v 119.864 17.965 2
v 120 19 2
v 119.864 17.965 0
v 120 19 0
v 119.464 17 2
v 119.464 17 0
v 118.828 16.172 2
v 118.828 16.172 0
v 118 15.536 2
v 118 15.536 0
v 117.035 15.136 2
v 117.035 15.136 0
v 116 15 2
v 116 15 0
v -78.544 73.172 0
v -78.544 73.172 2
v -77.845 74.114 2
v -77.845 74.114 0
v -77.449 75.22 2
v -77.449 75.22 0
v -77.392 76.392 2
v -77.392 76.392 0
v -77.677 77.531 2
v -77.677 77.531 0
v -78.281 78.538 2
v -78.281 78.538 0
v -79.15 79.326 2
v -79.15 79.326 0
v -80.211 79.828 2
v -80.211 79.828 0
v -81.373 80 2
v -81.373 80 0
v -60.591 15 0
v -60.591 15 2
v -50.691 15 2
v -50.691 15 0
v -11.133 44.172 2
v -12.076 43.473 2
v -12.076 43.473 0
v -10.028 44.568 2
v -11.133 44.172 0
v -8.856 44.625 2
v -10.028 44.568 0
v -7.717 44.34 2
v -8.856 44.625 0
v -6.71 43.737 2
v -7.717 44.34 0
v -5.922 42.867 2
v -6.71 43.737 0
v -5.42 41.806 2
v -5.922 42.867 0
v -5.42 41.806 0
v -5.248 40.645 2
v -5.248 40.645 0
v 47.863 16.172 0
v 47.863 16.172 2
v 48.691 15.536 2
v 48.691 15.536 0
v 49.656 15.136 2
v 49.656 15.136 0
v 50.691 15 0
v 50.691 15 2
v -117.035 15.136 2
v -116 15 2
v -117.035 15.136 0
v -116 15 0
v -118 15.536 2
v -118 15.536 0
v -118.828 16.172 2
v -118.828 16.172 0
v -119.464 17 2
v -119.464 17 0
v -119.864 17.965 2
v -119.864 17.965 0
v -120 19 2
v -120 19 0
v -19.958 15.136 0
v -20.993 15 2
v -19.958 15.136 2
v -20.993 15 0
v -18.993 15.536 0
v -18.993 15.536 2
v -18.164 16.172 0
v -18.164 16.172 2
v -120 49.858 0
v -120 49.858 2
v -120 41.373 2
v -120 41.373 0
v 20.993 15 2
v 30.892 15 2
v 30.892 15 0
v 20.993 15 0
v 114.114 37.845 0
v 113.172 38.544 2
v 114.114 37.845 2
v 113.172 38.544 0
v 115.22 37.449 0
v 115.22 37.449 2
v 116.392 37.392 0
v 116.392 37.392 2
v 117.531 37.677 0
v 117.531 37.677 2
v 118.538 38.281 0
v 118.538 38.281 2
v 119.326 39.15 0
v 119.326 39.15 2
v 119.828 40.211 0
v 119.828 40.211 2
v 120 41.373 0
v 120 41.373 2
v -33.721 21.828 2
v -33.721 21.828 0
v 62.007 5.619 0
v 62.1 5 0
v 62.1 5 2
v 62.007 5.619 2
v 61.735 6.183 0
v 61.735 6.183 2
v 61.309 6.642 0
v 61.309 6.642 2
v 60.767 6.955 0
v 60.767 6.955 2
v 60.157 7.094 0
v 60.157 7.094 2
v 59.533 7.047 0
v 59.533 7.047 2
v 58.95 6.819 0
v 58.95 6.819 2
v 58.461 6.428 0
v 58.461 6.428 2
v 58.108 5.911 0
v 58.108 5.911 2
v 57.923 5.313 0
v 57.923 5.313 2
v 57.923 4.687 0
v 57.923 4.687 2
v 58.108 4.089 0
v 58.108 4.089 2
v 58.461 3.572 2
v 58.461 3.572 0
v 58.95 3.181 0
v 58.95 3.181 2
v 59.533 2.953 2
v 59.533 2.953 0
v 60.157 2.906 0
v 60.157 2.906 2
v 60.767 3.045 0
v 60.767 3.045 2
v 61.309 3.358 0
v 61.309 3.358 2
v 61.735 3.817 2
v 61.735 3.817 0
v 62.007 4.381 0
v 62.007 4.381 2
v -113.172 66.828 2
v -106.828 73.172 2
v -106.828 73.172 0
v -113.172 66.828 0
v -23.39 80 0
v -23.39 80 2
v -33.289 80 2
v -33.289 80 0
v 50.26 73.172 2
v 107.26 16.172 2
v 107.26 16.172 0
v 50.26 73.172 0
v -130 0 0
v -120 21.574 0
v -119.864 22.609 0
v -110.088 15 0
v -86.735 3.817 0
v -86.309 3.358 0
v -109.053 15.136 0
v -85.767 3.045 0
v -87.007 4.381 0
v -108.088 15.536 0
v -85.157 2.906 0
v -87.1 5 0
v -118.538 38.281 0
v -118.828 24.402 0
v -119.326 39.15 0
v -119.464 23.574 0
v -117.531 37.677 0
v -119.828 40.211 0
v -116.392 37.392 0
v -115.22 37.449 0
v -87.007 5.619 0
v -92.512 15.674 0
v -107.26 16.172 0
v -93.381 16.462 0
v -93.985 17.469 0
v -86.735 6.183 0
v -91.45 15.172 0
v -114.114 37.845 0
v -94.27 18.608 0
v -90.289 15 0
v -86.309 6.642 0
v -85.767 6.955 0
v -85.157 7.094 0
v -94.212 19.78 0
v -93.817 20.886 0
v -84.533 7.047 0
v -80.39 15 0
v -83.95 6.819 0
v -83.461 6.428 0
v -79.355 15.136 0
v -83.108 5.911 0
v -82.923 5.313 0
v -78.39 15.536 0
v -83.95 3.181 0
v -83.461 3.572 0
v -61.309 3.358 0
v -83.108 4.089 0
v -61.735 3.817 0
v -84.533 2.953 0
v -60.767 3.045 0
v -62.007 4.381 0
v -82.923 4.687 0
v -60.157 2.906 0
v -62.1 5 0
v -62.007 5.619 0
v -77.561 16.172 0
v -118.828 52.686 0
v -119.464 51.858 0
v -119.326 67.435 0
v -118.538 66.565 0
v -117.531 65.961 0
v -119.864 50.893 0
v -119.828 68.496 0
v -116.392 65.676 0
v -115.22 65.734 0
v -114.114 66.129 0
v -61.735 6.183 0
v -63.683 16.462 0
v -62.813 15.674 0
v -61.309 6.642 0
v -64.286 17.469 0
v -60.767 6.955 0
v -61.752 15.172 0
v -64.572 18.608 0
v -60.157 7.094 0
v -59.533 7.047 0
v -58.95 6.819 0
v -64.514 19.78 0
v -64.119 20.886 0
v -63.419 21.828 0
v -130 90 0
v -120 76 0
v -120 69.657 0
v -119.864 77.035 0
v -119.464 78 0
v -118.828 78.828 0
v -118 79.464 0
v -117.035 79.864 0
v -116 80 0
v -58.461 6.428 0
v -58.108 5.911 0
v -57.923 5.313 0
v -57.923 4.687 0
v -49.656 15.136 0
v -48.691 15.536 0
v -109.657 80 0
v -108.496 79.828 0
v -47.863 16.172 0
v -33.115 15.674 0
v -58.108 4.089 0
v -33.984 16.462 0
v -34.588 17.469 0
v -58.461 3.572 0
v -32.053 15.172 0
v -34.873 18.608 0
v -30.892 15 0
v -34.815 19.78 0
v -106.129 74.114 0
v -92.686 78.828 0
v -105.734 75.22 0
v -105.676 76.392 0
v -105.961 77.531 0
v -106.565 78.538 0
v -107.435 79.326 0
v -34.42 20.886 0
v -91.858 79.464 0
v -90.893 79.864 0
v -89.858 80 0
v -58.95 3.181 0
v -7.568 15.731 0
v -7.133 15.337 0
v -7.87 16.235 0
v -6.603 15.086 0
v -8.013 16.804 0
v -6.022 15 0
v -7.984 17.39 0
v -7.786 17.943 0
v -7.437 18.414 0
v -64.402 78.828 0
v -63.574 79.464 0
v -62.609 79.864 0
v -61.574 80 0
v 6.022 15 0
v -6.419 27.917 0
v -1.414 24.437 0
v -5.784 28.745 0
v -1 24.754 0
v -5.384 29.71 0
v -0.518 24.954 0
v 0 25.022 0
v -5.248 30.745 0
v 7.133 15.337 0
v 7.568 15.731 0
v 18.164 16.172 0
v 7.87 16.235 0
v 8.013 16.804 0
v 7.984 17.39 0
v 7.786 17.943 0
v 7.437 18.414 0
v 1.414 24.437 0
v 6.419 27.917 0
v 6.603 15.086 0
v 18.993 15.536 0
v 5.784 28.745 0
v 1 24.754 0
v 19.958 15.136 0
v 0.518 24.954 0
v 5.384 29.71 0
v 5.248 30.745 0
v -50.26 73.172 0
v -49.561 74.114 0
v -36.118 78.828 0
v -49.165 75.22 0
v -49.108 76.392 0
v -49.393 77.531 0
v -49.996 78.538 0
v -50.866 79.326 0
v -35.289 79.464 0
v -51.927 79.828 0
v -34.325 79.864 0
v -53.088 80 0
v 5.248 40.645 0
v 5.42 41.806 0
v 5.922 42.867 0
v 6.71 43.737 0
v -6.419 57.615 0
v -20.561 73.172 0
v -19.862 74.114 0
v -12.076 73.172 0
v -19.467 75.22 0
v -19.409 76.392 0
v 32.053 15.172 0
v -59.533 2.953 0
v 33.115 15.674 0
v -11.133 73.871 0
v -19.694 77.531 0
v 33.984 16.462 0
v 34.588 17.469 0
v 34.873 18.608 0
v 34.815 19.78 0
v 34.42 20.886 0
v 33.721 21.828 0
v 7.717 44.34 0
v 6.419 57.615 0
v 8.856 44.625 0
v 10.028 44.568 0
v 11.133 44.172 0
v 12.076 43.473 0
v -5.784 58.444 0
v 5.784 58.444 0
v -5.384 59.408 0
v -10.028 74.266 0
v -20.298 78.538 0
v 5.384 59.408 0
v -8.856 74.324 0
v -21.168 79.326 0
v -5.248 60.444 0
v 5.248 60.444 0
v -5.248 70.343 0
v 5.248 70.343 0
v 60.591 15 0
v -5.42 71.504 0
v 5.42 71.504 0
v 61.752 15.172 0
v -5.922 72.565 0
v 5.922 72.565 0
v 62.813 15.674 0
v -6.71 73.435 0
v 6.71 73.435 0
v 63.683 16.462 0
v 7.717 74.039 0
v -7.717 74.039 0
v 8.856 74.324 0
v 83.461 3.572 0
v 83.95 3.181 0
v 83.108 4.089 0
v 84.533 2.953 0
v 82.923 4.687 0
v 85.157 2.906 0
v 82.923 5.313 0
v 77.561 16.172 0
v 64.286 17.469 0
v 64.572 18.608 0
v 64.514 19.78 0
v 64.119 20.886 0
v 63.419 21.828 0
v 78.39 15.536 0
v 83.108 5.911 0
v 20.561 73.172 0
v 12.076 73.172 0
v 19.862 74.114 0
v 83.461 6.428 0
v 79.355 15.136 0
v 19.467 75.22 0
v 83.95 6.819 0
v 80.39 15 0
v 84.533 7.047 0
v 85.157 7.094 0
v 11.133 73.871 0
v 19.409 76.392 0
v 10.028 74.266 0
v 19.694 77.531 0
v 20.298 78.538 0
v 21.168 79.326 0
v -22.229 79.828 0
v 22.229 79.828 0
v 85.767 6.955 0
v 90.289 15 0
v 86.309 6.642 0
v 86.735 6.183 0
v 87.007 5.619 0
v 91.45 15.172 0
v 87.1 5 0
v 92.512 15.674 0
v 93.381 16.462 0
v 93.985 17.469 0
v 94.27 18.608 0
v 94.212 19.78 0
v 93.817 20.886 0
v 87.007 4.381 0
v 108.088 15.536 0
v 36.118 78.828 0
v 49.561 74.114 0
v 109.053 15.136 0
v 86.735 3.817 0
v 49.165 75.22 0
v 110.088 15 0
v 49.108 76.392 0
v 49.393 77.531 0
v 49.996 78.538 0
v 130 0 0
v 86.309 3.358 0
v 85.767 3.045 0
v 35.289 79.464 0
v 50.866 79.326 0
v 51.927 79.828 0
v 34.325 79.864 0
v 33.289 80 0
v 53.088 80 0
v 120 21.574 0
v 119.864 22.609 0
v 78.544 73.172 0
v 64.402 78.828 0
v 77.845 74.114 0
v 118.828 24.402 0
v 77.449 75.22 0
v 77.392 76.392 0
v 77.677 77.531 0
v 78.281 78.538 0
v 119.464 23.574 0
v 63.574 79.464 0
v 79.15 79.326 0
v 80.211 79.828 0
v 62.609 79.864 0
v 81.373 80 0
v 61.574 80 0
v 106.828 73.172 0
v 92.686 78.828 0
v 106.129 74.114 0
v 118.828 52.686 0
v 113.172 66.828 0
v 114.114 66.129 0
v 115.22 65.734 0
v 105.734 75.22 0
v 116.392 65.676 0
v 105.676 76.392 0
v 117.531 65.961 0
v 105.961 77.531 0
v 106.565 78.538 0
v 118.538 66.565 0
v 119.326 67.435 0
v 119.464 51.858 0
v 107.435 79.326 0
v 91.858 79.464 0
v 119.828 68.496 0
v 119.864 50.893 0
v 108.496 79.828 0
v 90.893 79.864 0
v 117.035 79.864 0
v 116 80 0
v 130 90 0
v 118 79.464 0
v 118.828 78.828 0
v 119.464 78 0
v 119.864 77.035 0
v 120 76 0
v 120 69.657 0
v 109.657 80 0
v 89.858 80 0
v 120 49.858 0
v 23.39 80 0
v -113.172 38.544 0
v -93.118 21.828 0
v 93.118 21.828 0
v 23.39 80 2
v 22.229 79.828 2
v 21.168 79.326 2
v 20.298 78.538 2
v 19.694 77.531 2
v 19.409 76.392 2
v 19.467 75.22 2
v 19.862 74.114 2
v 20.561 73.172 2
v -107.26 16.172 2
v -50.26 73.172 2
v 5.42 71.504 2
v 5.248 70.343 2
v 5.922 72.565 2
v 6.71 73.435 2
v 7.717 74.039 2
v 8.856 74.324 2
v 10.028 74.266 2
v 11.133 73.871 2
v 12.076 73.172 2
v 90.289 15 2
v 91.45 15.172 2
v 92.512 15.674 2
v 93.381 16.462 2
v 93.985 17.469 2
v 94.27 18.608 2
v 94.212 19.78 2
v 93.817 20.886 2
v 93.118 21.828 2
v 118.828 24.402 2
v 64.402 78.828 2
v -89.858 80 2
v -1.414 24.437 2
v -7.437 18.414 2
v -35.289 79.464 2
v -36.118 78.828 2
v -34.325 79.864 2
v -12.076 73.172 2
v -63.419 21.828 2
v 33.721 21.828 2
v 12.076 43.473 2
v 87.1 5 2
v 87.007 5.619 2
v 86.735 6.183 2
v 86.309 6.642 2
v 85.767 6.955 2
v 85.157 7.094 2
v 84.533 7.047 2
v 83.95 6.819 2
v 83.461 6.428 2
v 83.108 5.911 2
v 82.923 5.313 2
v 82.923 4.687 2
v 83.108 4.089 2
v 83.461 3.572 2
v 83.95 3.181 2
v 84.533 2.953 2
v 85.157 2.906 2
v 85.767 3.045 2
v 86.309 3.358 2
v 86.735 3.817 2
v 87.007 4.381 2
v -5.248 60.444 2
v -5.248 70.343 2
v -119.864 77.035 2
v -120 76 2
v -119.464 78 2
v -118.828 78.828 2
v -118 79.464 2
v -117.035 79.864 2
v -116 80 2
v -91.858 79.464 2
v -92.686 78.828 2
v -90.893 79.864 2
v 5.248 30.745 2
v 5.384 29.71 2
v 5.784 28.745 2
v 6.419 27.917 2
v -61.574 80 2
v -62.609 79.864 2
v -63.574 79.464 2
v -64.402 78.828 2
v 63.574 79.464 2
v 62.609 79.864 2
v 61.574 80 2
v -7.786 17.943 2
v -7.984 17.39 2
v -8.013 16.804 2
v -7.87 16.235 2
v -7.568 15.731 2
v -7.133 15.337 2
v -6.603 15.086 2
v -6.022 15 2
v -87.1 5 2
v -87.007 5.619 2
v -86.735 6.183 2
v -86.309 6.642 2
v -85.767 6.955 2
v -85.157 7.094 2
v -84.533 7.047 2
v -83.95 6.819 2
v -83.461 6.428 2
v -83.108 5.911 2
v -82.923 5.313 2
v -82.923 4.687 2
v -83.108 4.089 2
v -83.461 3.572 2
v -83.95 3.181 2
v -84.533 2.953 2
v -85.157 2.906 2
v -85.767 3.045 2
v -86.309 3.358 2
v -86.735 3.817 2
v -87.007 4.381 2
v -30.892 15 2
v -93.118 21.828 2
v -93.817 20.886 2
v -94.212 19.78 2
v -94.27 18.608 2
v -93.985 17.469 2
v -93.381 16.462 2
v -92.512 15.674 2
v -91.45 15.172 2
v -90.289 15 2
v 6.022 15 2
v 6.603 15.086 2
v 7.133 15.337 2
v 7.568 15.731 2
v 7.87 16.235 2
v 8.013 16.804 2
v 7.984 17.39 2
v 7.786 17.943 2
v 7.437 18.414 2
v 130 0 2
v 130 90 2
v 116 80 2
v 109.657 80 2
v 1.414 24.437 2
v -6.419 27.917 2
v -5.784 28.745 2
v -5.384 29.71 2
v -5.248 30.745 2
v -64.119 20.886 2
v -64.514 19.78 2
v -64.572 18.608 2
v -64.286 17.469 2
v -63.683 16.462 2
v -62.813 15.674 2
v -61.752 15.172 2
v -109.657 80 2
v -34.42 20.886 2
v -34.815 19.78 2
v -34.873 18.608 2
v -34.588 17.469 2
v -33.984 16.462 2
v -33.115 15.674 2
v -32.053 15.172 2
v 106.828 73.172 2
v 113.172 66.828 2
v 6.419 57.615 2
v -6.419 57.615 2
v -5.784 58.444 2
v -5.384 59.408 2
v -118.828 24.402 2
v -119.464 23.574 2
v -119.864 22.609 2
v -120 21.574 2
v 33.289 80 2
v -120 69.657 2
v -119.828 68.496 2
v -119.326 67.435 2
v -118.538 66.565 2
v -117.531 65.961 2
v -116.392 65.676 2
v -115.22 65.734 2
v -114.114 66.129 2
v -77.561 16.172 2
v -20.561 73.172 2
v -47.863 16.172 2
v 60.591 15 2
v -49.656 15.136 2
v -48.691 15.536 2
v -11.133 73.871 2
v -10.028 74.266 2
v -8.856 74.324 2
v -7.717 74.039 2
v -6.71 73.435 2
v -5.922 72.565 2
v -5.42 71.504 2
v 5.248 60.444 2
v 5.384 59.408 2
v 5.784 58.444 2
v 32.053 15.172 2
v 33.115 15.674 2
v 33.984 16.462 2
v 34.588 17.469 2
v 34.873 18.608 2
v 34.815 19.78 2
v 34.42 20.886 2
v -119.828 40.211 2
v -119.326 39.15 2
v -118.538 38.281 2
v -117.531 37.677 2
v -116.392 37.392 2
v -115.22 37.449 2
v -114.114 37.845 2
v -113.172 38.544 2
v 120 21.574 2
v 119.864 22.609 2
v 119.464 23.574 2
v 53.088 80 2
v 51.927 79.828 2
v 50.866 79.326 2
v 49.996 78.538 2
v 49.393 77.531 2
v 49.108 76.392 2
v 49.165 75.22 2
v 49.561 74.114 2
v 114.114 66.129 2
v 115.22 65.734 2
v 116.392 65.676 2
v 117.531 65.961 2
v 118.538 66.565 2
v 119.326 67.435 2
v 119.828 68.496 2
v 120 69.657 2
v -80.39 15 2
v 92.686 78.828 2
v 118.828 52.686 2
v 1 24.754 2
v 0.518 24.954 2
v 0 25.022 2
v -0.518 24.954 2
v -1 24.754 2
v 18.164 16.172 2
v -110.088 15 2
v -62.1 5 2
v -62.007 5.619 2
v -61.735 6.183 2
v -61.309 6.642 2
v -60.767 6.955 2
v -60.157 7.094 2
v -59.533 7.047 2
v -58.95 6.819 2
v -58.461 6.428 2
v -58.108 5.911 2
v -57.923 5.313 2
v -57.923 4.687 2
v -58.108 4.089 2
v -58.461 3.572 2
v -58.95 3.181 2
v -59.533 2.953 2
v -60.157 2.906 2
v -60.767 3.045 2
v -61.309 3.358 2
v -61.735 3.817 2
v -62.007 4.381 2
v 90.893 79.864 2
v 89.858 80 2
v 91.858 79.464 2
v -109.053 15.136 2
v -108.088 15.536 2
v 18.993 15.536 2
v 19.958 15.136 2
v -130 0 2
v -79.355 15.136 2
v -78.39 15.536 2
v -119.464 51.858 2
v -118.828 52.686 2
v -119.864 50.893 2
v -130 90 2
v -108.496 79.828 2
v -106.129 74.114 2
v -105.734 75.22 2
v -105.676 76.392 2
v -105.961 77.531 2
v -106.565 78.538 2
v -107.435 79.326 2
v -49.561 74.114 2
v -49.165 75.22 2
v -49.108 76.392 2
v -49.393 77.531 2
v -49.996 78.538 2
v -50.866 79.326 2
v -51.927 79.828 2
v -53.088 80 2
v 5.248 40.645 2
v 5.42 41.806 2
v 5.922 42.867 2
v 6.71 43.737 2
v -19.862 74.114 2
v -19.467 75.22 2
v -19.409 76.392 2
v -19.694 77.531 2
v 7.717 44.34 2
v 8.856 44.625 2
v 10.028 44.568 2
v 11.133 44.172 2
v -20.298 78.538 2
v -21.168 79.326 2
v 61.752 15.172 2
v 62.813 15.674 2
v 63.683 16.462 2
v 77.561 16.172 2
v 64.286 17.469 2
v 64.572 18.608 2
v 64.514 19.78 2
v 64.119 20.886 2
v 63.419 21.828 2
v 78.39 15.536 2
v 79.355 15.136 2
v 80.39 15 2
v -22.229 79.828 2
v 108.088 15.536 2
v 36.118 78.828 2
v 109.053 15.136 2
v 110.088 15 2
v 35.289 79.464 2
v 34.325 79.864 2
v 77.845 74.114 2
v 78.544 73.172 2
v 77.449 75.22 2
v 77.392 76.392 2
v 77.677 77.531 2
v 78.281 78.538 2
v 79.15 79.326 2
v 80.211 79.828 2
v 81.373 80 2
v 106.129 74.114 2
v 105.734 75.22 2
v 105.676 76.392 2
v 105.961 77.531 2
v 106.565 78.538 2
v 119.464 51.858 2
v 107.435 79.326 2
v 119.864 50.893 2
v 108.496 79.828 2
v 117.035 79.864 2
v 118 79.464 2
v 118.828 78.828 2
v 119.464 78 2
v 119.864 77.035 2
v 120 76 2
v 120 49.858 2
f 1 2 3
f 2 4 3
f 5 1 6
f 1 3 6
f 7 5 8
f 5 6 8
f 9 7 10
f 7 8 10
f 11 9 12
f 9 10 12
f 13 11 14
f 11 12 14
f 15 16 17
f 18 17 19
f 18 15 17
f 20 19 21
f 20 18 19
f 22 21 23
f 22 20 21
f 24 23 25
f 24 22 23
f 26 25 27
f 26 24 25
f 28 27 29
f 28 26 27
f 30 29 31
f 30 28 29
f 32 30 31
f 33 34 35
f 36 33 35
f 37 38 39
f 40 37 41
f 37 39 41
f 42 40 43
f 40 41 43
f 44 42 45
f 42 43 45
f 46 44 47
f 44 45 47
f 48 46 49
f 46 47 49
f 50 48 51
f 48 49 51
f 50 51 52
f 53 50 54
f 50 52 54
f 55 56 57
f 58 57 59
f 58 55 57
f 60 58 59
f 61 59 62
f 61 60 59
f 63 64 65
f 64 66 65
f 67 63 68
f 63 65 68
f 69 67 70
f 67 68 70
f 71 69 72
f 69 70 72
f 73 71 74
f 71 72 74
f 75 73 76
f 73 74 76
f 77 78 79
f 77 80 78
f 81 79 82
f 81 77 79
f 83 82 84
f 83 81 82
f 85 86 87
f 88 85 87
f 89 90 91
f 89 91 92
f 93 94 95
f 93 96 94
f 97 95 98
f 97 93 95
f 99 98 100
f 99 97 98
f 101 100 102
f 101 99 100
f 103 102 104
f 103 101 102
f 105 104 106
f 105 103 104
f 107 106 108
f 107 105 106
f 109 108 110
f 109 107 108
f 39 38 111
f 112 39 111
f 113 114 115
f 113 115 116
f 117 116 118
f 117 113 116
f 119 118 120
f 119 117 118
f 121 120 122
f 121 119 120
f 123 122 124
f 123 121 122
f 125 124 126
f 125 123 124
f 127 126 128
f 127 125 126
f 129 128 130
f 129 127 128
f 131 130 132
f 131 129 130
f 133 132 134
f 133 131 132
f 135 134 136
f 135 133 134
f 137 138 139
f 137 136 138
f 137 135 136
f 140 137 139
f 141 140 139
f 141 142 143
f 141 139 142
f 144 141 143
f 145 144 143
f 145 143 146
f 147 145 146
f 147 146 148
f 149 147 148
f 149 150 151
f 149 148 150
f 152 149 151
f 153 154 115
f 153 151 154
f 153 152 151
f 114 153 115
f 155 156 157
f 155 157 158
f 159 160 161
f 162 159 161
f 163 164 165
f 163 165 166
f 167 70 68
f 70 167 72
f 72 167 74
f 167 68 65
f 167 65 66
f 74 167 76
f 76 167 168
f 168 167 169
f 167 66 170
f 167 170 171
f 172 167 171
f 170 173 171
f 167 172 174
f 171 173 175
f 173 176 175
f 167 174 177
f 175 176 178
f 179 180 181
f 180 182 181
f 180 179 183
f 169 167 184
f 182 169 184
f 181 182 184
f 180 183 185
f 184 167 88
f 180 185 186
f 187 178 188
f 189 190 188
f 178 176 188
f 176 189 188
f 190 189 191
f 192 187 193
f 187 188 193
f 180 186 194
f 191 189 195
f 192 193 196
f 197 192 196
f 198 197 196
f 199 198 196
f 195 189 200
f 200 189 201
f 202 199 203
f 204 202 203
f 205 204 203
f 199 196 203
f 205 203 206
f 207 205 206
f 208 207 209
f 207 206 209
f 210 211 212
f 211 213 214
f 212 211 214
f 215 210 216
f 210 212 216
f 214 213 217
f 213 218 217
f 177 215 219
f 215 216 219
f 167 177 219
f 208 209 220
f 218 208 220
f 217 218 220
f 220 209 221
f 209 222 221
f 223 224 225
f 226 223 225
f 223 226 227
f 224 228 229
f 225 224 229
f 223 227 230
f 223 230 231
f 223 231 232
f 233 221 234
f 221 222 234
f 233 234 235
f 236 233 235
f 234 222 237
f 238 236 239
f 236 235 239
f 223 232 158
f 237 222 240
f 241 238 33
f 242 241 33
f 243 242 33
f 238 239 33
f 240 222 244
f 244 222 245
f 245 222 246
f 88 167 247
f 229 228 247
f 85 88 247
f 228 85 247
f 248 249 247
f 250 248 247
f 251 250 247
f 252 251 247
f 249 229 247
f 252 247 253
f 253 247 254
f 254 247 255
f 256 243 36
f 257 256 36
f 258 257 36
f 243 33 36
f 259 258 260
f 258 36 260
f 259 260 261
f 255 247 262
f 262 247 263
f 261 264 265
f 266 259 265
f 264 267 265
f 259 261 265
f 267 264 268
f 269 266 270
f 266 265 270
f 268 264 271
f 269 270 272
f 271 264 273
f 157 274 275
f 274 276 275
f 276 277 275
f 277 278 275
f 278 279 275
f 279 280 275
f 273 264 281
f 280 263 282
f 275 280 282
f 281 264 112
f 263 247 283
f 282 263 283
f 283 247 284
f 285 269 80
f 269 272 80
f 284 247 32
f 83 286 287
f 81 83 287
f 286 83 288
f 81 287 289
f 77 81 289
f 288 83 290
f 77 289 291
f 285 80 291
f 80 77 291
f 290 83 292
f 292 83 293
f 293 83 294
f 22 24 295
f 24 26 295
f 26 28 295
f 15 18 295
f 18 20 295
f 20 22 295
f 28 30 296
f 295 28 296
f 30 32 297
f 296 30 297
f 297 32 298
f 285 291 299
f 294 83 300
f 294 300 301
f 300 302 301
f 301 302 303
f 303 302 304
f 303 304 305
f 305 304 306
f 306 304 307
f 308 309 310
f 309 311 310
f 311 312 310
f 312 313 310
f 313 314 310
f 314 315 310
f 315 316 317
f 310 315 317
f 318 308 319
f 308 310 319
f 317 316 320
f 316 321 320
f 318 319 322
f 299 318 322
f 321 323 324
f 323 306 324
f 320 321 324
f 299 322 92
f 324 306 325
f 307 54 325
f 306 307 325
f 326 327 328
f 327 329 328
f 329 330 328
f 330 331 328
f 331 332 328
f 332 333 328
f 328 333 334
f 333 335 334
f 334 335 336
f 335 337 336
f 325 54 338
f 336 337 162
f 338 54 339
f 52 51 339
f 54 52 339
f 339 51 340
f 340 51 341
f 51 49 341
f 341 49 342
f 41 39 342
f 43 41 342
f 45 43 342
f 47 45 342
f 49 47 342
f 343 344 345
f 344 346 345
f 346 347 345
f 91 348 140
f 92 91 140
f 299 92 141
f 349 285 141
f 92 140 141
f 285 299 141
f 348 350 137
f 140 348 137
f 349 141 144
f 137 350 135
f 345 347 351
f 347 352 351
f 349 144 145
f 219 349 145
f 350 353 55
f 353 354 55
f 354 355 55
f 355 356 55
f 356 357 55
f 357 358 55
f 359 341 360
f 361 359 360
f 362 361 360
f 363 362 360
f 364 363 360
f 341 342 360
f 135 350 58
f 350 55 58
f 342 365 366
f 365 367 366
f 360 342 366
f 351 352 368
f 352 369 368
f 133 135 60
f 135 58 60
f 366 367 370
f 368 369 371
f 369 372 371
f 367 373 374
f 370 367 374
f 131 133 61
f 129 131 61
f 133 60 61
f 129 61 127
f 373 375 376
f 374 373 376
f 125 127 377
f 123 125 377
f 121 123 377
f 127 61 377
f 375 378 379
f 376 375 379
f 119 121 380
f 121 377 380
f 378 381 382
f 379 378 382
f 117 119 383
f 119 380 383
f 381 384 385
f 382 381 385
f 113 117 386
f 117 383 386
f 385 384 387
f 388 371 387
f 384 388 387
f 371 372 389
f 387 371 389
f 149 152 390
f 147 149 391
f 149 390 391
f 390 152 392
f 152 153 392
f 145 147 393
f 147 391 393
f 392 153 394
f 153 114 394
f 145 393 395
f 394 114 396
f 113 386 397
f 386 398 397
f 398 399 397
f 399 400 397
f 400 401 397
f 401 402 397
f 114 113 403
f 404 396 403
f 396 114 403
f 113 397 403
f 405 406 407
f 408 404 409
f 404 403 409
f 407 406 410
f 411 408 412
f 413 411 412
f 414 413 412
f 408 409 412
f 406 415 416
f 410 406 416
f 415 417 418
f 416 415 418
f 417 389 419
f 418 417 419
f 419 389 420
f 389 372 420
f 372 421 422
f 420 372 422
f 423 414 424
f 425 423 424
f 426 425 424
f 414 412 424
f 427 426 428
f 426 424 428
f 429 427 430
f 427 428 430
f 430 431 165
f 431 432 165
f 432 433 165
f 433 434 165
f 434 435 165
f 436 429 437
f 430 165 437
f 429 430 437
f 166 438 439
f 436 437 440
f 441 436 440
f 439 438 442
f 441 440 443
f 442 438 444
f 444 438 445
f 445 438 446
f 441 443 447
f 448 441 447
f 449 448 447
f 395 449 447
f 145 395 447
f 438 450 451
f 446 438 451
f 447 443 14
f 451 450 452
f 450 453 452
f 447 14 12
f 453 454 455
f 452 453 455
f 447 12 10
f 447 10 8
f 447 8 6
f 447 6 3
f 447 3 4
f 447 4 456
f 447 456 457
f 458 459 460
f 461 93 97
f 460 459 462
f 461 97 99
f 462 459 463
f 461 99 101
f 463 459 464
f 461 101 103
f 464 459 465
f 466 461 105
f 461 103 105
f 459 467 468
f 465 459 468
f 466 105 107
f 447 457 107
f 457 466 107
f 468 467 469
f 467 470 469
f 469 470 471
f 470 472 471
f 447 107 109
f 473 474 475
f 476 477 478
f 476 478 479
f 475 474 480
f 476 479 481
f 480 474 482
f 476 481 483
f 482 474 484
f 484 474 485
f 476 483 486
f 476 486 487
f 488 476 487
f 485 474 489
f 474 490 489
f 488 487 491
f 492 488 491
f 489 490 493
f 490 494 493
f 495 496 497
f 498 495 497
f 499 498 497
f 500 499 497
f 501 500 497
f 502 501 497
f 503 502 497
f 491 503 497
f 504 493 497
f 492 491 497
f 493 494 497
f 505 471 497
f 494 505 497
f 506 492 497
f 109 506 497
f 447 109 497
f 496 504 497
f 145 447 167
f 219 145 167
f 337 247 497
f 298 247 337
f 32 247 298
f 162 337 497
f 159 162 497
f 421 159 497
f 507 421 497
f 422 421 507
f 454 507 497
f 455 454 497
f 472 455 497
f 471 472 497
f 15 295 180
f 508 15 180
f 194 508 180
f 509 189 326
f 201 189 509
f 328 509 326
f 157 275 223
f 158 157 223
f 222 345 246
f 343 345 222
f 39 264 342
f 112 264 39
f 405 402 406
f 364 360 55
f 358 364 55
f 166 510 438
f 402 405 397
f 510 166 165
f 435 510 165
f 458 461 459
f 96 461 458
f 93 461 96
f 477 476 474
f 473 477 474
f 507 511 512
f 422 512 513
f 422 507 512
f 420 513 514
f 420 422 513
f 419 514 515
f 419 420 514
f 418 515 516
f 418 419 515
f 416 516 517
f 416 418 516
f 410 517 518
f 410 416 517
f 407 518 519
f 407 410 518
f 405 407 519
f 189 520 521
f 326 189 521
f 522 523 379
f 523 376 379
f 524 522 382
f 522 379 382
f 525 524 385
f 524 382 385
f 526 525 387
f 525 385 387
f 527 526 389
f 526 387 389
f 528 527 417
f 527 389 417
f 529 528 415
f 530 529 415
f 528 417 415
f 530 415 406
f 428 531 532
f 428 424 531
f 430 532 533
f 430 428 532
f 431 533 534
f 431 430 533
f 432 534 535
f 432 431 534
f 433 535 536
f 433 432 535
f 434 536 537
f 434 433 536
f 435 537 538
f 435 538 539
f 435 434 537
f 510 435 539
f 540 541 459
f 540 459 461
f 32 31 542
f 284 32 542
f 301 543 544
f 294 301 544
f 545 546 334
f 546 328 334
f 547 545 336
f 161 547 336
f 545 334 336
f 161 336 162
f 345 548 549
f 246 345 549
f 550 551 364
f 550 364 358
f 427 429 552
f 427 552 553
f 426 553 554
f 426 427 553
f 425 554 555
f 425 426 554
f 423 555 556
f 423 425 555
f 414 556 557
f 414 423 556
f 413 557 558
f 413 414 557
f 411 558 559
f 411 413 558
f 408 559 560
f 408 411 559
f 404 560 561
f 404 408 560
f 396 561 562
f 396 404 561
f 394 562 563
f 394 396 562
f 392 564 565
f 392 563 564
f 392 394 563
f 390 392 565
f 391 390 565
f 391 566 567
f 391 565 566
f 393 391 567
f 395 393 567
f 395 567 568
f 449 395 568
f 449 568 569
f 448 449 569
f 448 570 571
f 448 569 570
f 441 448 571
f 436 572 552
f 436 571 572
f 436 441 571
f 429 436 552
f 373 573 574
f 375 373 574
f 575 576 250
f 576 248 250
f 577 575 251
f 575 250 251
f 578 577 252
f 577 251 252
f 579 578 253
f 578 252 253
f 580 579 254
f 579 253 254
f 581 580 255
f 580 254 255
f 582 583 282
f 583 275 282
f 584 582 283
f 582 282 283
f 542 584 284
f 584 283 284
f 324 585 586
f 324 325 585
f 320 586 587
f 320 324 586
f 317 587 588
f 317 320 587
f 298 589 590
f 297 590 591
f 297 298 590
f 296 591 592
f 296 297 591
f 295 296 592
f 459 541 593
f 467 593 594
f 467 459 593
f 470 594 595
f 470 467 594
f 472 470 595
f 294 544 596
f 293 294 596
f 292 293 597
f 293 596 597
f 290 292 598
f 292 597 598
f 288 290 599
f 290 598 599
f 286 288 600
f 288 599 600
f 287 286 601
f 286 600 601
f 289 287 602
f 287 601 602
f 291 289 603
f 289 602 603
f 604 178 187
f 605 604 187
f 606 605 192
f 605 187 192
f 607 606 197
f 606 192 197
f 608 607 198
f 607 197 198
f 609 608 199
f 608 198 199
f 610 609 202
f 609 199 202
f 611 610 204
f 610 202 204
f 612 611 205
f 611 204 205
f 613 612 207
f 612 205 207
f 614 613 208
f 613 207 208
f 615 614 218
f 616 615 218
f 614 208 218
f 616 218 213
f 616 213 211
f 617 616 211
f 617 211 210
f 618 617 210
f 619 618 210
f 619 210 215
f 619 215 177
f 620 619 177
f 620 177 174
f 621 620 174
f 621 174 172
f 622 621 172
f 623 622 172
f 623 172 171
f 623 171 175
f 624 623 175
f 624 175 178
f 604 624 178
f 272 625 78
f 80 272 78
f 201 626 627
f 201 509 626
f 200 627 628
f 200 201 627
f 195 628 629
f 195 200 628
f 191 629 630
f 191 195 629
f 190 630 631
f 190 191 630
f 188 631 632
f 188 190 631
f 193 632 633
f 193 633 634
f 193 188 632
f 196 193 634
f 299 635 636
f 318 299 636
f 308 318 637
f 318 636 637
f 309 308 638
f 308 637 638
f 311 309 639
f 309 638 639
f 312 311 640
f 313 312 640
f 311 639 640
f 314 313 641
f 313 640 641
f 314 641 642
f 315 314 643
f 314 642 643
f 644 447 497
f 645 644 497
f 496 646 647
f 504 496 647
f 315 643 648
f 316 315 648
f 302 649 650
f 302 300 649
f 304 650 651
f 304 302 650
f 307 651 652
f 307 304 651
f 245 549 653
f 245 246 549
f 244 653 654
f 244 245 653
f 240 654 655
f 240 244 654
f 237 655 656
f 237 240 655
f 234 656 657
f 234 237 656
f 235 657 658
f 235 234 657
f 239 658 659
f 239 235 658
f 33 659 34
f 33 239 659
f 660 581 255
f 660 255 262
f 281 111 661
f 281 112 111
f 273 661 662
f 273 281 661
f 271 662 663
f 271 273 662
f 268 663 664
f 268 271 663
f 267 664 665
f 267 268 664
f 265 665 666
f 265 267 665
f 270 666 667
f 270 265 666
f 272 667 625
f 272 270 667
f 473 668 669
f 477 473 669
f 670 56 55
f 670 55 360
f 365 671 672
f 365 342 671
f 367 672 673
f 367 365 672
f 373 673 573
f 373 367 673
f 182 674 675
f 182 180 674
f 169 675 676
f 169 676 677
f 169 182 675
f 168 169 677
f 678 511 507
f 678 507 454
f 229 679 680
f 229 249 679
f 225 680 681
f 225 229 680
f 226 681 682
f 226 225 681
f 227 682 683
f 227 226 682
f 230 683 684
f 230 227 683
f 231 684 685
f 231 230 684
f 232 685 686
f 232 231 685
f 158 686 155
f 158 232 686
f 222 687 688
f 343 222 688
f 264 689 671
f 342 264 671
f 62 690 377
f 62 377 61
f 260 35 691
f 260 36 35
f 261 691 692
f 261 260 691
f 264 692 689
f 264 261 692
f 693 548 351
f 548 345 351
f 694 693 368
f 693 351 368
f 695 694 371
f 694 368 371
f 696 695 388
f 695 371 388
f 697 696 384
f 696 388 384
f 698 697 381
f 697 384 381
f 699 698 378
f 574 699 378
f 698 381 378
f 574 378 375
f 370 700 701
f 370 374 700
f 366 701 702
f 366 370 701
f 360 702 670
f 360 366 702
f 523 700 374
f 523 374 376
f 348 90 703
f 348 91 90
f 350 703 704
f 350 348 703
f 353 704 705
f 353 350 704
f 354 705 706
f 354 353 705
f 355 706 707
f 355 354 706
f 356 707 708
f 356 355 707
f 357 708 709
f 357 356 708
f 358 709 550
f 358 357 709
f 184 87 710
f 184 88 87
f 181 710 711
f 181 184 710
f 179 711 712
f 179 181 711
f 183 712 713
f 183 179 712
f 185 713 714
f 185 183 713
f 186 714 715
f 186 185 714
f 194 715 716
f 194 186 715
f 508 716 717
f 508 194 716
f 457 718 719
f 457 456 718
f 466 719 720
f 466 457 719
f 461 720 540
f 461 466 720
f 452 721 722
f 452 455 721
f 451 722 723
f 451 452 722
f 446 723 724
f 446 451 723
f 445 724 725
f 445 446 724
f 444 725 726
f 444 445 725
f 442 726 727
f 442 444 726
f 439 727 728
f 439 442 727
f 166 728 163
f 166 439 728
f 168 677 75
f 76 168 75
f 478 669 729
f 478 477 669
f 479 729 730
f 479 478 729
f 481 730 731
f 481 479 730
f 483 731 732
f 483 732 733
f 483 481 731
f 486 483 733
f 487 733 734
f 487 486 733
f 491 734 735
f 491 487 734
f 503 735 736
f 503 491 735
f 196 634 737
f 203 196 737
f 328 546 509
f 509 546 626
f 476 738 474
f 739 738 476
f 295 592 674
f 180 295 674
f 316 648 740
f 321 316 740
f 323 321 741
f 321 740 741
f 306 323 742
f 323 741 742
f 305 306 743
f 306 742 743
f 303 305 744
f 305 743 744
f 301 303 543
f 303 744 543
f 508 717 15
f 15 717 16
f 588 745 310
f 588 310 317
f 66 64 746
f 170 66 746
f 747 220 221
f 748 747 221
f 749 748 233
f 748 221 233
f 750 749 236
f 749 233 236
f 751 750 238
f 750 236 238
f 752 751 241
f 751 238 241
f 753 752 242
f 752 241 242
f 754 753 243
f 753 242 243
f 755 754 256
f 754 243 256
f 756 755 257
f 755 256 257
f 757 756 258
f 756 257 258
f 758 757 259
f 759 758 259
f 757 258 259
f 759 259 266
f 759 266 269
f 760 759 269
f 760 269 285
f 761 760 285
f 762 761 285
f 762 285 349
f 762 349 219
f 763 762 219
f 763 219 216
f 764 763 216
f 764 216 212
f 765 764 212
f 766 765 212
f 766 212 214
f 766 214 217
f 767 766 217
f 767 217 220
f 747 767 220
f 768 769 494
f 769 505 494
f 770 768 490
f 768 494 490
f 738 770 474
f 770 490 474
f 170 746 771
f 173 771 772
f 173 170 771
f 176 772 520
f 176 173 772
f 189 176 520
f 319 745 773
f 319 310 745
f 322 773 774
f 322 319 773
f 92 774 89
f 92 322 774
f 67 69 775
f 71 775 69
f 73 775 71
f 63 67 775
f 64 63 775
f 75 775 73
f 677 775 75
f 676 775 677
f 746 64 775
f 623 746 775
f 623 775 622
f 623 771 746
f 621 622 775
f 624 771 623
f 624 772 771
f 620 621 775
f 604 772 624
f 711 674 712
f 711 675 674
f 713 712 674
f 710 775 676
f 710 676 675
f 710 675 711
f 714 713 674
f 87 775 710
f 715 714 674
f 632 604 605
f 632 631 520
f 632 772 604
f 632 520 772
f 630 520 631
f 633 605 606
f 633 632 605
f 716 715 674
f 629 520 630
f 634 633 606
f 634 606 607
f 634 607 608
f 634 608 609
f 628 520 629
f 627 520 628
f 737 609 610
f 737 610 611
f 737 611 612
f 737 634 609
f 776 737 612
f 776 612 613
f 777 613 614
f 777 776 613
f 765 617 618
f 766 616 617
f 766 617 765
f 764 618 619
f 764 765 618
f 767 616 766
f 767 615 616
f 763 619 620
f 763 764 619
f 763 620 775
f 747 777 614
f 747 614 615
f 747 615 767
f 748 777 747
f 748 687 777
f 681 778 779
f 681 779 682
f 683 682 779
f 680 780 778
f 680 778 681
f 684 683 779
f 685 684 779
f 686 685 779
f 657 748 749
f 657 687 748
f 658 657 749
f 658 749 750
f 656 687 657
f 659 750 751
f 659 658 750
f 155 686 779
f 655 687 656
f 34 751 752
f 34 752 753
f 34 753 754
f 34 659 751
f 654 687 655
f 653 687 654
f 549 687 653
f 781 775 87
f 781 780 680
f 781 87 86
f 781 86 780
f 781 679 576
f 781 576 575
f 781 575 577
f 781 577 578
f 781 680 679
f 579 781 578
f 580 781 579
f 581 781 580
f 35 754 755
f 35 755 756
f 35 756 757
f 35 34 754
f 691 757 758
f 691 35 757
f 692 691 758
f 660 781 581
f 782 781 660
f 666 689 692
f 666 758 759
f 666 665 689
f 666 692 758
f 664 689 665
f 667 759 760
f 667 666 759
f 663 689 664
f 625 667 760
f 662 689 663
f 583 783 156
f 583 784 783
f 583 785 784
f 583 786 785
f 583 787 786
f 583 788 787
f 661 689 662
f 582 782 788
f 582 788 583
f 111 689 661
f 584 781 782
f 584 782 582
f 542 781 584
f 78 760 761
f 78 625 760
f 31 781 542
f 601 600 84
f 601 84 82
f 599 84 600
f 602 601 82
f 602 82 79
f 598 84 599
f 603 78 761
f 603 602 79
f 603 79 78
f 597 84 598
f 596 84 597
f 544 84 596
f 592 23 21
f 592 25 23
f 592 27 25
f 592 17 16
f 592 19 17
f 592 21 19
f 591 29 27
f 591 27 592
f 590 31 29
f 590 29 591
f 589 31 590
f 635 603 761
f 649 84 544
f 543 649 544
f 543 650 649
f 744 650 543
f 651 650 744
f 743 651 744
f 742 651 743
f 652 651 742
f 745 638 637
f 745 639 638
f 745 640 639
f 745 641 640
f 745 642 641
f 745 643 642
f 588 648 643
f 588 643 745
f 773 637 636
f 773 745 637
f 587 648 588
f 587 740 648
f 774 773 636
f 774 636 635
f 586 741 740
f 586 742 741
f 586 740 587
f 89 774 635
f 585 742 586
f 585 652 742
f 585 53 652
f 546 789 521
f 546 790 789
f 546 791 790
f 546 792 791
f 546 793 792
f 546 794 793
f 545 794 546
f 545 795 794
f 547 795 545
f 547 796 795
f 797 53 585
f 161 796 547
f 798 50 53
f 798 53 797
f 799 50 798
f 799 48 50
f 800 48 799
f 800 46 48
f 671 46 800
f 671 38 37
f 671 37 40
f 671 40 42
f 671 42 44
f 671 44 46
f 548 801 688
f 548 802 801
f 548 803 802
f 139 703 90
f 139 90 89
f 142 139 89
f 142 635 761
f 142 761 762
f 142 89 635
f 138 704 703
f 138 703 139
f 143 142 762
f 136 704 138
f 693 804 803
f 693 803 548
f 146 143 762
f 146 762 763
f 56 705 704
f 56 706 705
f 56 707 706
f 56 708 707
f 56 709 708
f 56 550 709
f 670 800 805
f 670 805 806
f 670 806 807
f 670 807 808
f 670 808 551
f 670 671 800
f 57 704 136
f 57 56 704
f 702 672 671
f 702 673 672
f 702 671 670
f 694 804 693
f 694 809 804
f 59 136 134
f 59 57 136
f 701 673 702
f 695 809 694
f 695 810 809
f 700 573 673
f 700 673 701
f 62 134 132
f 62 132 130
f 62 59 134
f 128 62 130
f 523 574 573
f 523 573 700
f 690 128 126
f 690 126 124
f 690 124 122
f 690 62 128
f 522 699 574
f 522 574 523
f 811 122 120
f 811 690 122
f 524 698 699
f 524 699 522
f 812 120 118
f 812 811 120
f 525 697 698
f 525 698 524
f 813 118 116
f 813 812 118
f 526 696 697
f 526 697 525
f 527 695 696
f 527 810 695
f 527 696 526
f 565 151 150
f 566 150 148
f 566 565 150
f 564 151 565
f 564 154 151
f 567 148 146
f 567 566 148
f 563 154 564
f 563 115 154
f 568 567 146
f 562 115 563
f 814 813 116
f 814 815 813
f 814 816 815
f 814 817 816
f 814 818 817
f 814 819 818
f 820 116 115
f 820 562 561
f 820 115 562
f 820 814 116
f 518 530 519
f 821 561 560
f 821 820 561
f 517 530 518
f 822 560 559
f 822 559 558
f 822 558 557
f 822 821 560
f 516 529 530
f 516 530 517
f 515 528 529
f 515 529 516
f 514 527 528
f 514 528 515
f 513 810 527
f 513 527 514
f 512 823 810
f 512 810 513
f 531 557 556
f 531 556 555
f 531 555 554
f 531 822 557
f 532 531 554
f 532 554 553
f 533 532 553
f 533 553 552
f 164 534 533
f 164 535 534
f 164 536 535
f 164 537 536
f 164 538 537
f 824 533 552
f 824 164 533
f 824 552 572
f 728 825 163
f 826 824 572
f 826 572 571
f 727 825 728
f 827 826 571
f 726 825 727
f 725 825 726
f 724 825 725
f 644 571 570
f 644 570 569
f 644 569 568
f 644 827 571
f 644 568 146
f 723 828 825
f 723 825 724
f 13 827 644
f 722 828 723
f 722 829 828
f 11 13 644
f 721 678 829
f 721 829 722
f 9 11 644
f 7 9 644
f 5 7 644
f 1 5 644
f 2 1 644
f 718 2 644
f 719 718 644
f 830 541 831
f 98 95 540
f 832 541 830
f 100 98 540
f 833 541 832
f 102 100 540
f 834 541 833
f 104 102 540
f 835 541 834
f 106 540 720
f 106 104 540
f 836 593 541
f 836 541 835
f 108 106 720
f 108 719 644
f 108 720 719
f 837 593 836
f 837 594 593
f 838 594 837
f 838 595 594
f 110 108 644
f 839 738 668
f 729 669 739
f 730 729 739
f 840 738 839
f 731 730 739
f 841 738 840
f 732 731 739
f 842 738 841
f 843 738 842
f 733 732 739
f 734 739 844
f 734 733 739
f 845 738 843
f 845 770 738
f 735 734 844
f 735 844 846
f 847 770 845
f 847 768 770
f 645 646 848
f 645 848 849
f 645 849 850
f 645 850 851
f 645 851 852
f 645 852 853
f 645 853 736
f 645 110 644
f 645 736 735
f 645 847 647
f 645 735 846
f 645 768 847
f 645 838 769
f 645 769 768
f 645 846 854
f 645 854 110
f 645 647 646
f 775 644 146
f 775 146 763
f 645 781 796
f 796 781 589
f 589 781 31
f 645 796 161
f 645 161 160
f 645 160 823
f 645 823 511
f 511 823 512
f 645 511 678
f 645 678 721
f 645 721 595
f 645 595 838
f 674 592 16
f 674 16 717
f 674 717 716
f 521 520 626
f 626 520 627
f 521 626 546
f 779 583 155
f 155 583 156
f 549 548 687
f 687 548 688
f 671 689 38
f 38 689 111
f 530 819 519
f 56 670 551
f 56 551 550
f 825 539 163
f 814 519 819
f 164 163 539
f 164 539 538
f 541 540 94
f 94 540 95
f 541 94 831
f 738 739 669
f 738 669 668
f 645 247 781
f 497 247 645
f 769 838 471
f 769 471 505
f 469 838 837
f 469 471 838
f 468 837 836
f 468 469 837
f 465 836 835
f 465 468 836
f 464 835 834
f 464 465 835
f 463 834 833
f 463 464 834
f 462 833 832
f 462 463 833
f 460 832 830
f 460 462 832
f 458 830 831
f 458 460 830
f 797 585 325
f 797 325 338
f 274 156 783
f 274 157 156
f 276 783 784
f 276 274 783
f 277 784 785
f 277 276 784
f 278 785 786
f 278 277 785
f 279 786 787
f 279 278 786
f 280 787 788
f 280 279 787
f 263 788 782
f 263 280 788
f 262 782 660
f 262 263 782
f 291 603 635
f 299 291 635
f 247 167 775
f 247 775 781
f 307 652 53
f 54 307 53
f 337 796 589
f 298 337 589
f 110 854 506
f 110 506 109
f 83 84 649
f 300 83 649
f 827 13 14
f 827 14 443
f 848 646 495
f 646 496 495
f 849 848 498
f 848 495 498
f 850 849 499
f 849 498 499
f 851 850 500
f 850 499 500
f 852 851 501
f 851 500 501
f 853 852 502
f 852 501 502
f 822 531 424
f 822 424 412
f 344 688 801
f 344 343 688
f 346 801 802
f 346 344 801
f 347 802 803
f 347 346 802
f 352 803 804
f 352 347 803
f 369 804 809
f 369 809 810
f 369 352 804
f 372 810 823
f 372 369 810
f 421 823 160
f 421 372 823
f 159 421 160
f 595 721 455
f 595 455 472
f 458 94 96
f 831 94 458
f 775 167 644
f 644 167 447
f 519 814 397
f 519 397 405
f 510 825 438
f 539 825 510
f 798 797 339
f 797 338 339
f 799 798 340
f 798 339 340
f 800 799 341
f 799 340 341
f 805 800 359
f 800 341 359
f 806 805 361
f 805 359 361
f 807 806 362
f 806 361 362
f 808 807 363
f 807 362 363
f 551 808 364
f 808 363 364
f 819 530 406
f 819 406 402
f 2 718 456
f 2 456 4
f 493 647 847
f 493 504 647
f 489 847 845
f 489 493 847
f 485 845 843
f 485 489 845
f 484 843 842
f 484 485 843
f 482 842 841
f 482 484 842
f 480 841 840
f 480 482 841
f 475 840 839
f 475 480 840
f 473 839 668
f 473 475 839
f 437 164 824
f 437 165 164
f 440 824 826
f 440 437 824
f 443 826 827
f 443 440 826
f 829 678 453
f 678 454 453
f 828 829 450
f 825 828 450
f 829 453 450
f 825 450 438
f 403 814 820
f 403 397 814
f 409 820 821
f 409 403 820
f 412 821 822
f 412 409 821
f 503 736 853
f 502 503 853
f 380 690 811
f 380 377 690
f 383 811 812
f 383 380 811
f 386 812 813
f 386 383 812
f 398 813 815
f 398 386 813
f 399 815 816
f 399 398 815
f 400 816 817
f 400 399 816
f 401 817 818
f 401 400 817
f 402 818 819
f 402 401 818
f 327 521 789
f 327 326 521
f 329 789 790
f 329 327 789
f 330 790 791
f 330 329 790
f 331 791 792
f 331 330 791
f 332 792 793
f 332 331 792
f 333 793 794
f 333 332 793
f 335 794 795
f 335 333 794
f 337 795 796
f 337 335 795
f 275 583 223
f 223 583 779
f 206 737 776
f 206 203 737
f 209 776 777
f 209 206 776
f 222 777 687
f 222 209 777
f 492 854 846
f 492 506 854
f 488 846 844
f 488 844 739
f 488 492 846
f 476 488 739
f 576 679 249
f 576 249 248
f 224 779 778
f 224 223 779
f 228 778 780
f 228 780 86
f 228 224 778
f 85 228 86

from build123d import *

# Parameters (mm, degrees)
SKETCH_1_W              = 260
SKETCH_1_H              = 90
EXTRUDE_1_DEPTH         = 2
HOLE_WIZARD_4_2_4_2_1_D = 4.2
CUT_EXTRUDE_1_DEPTH     = 159.126531613
FILLET_1_R              = 4
FILLET_1_OF_MIRROR_2_R  = 4
CUT_EXTRUDE_2_DEPTH     = 159.126531613


with BuildPart() as part:
    # 草图1 → 凸台-拉伸1 (new body)
    with BuildSketch(Plane.XY):
        with Locations((0, 45)):
            Rectangle(SKETCH_1_W, SKETCH_1_H)
    extrude(amount=EXTRUDE_1_DEPTH)

    # Ø4.2 (4.2) 直径孔1 (through all)
    with Locations(Plane(origin=(-60, 5, 2), x_dir=(1, 0, 0), z_dir=(0, 0, 1))):
        with Locations((0, 0), (-25, 0)):
            hole_wizard_4_2_4_2_1 = Hole(HOLE_WIZARD_4_2_4_2_1_D / 2)

    # 镜向1: Ø4.2 (4.2) 直径孔1 across plane
    add(hole_wizard_4_2_4_2_1.mirror(Plane(origin=(0, 0, 0), x_dir=(0, 0, 1), z_dir=(1, 0, 0))), mode=Mode.SUBTRACT)

    # 草图5 → 切除-拉伸1 (cut, through all)
    with BuildSketch(Plane.XY.offset(2)):
        Polygon((-120, 80), (-100, 80), (-120, 60), align=None)
        Polygon((-120, 15), (-108.431457505, 15), (-43.431457505, 80), (-63.230447378, 80), (-120, 23.230447378), align=None)
        Polygon((-5.247691321, 50.30151519), (-40.549206511, 15), (-19.336003076, 15), (-5.247691321, 29.088311755), align=None)
        Polygon((-91.514718626, 80), (-120, 51.514718626), (-120, 31.715728753), (-71.715728753, 80), align=None)
        Polygon((-34.946176131, 80), (-99.946176131, 15), (-78.732972695, 15), (-13.732972695, 80), align=None)
        Polygon((-5.247691321, 80), (-70.247691321, 15), (-49.034487885, 15), (-5.247691321, 58.786796564), align=None)
    cut_extrude_1 = extrude(amount=-CUT_EXTRUDE_1_DEPTH, mode=Mode.SUBTRACT)

    # 圆角1
    fillet_1_edges = [part.edges().sort_by_distance(p)[0] for p in [
        (-5.247691321, 80, 1),
        (-5.247691321, 58.786796564, 1),
        (-49.034487885, 15, 1),
        (-70.247691321, 15, 1),
        (-91.514718626, 80, 1),
        (-71.715728753, 80, 1),
        (-120, 31.715728753, 1),
        (-120, 51.514718626, 1),
        (-120, 15, 1),
        (-120, 23.230447378, 1),
        (-63.230447378, 80, 1),
        (-43.431457505, 80, 1),
        (-108.431457505, 15, 1),
        (-5.247691321, 50.30151519, 1),
        (-5.247691321, 29.088311755, 1),
        (-19.336003076, 15, 1),
        (-40.549206511, 15, 1),
        (-34.946176131, 80, 1),
        (-13.732972695, 80, 1),
        (-78.732972695, 15, 1),
        (-99.946176131, 15, 1),
        (-120, 60, 1),
        (-120, 80, 1),
        (-100, 80, 1),
    ]]
    fillet(fillet_1_edges, radius=FILLET_1_R)

    # 镜向2: 切除-拉伸1 across plane
    add(cut_extrude_1.mirror(Plane(origin=(0, 0, 0), x_dir=(0, 0, 1), z_dir=(1, 0, 0))), mode=Mode.SUBTRACT)

    # 圆角1 of 镜向2
    fillet_1_of_mirror_2_edges = [part.edges().sort_by_distance(p)[0] for p in [
        (5.247691321, 80, 1),
        (5.247691321, 58.786796564, 1),
        (49.034487885, 15, 1),
        (70.247691321, 15, 1),
        (91.514718626, 80, 1),
        (71.715728753, 80, 1),
        (120, 31.715728753, 1),
        (120, 51.514718626, 1),
        (120, 15, 1),
        (120, 23.230447378, 1),
        (63.230447378, 80, 1),
        (43.431457505, 80, 1),
        (108.431457505, 15, 1),
        (5.247691321, 50.30151519, 1),
        (5.247691321, 29.088311755, 1),
        (19.336003076, 15, 1),
        (40.549206511, 15, 1),
        (34.946176131, 80, 1),
        (13.732972695, 80, 1),
        (78.732972695, 15, 1),
        (99.946176131, 15, 1),
        (120, 60, 1),
        (120, 80, 1),
        (100, 80, 1),
    ]]
    fillet(fillet_1_of_mirror_2_edges, radius=FILLET_1_OF_MIRROR_2_R)

    # 草图6 → 切除-拉伸2 (cut, through all)
    with BuildSketch(Plane.XY.offset(2)):
        with BuildLine():
            Line((-1.414213562, 24.436508139), (-7.436508139, 18.414213562))
            ThreePointArc((-7.436508139, 18.414213562), (-7.870053642, 16.234633135), (-6.022294577, 15))
            Line((-6.022294577, 15), (6.022294577, 15))
            ThreePointArc((6.022294577, 15), (7.870053642, 16.234633135), (7.436508139, 18.414213562))
            Line((7.436508139, 18.414213562), (1.414213562, 24.436508139))
            ThreePointArc((1.414213562, 24.436508139), (0, 25.022294577), (-1.414213562, 24.436508139))
        make_face()
    extrude(amount=-CUT_EXTRUDE_2_DEPTH, mode=Mode.SUBTRACT)


solid = part.part
